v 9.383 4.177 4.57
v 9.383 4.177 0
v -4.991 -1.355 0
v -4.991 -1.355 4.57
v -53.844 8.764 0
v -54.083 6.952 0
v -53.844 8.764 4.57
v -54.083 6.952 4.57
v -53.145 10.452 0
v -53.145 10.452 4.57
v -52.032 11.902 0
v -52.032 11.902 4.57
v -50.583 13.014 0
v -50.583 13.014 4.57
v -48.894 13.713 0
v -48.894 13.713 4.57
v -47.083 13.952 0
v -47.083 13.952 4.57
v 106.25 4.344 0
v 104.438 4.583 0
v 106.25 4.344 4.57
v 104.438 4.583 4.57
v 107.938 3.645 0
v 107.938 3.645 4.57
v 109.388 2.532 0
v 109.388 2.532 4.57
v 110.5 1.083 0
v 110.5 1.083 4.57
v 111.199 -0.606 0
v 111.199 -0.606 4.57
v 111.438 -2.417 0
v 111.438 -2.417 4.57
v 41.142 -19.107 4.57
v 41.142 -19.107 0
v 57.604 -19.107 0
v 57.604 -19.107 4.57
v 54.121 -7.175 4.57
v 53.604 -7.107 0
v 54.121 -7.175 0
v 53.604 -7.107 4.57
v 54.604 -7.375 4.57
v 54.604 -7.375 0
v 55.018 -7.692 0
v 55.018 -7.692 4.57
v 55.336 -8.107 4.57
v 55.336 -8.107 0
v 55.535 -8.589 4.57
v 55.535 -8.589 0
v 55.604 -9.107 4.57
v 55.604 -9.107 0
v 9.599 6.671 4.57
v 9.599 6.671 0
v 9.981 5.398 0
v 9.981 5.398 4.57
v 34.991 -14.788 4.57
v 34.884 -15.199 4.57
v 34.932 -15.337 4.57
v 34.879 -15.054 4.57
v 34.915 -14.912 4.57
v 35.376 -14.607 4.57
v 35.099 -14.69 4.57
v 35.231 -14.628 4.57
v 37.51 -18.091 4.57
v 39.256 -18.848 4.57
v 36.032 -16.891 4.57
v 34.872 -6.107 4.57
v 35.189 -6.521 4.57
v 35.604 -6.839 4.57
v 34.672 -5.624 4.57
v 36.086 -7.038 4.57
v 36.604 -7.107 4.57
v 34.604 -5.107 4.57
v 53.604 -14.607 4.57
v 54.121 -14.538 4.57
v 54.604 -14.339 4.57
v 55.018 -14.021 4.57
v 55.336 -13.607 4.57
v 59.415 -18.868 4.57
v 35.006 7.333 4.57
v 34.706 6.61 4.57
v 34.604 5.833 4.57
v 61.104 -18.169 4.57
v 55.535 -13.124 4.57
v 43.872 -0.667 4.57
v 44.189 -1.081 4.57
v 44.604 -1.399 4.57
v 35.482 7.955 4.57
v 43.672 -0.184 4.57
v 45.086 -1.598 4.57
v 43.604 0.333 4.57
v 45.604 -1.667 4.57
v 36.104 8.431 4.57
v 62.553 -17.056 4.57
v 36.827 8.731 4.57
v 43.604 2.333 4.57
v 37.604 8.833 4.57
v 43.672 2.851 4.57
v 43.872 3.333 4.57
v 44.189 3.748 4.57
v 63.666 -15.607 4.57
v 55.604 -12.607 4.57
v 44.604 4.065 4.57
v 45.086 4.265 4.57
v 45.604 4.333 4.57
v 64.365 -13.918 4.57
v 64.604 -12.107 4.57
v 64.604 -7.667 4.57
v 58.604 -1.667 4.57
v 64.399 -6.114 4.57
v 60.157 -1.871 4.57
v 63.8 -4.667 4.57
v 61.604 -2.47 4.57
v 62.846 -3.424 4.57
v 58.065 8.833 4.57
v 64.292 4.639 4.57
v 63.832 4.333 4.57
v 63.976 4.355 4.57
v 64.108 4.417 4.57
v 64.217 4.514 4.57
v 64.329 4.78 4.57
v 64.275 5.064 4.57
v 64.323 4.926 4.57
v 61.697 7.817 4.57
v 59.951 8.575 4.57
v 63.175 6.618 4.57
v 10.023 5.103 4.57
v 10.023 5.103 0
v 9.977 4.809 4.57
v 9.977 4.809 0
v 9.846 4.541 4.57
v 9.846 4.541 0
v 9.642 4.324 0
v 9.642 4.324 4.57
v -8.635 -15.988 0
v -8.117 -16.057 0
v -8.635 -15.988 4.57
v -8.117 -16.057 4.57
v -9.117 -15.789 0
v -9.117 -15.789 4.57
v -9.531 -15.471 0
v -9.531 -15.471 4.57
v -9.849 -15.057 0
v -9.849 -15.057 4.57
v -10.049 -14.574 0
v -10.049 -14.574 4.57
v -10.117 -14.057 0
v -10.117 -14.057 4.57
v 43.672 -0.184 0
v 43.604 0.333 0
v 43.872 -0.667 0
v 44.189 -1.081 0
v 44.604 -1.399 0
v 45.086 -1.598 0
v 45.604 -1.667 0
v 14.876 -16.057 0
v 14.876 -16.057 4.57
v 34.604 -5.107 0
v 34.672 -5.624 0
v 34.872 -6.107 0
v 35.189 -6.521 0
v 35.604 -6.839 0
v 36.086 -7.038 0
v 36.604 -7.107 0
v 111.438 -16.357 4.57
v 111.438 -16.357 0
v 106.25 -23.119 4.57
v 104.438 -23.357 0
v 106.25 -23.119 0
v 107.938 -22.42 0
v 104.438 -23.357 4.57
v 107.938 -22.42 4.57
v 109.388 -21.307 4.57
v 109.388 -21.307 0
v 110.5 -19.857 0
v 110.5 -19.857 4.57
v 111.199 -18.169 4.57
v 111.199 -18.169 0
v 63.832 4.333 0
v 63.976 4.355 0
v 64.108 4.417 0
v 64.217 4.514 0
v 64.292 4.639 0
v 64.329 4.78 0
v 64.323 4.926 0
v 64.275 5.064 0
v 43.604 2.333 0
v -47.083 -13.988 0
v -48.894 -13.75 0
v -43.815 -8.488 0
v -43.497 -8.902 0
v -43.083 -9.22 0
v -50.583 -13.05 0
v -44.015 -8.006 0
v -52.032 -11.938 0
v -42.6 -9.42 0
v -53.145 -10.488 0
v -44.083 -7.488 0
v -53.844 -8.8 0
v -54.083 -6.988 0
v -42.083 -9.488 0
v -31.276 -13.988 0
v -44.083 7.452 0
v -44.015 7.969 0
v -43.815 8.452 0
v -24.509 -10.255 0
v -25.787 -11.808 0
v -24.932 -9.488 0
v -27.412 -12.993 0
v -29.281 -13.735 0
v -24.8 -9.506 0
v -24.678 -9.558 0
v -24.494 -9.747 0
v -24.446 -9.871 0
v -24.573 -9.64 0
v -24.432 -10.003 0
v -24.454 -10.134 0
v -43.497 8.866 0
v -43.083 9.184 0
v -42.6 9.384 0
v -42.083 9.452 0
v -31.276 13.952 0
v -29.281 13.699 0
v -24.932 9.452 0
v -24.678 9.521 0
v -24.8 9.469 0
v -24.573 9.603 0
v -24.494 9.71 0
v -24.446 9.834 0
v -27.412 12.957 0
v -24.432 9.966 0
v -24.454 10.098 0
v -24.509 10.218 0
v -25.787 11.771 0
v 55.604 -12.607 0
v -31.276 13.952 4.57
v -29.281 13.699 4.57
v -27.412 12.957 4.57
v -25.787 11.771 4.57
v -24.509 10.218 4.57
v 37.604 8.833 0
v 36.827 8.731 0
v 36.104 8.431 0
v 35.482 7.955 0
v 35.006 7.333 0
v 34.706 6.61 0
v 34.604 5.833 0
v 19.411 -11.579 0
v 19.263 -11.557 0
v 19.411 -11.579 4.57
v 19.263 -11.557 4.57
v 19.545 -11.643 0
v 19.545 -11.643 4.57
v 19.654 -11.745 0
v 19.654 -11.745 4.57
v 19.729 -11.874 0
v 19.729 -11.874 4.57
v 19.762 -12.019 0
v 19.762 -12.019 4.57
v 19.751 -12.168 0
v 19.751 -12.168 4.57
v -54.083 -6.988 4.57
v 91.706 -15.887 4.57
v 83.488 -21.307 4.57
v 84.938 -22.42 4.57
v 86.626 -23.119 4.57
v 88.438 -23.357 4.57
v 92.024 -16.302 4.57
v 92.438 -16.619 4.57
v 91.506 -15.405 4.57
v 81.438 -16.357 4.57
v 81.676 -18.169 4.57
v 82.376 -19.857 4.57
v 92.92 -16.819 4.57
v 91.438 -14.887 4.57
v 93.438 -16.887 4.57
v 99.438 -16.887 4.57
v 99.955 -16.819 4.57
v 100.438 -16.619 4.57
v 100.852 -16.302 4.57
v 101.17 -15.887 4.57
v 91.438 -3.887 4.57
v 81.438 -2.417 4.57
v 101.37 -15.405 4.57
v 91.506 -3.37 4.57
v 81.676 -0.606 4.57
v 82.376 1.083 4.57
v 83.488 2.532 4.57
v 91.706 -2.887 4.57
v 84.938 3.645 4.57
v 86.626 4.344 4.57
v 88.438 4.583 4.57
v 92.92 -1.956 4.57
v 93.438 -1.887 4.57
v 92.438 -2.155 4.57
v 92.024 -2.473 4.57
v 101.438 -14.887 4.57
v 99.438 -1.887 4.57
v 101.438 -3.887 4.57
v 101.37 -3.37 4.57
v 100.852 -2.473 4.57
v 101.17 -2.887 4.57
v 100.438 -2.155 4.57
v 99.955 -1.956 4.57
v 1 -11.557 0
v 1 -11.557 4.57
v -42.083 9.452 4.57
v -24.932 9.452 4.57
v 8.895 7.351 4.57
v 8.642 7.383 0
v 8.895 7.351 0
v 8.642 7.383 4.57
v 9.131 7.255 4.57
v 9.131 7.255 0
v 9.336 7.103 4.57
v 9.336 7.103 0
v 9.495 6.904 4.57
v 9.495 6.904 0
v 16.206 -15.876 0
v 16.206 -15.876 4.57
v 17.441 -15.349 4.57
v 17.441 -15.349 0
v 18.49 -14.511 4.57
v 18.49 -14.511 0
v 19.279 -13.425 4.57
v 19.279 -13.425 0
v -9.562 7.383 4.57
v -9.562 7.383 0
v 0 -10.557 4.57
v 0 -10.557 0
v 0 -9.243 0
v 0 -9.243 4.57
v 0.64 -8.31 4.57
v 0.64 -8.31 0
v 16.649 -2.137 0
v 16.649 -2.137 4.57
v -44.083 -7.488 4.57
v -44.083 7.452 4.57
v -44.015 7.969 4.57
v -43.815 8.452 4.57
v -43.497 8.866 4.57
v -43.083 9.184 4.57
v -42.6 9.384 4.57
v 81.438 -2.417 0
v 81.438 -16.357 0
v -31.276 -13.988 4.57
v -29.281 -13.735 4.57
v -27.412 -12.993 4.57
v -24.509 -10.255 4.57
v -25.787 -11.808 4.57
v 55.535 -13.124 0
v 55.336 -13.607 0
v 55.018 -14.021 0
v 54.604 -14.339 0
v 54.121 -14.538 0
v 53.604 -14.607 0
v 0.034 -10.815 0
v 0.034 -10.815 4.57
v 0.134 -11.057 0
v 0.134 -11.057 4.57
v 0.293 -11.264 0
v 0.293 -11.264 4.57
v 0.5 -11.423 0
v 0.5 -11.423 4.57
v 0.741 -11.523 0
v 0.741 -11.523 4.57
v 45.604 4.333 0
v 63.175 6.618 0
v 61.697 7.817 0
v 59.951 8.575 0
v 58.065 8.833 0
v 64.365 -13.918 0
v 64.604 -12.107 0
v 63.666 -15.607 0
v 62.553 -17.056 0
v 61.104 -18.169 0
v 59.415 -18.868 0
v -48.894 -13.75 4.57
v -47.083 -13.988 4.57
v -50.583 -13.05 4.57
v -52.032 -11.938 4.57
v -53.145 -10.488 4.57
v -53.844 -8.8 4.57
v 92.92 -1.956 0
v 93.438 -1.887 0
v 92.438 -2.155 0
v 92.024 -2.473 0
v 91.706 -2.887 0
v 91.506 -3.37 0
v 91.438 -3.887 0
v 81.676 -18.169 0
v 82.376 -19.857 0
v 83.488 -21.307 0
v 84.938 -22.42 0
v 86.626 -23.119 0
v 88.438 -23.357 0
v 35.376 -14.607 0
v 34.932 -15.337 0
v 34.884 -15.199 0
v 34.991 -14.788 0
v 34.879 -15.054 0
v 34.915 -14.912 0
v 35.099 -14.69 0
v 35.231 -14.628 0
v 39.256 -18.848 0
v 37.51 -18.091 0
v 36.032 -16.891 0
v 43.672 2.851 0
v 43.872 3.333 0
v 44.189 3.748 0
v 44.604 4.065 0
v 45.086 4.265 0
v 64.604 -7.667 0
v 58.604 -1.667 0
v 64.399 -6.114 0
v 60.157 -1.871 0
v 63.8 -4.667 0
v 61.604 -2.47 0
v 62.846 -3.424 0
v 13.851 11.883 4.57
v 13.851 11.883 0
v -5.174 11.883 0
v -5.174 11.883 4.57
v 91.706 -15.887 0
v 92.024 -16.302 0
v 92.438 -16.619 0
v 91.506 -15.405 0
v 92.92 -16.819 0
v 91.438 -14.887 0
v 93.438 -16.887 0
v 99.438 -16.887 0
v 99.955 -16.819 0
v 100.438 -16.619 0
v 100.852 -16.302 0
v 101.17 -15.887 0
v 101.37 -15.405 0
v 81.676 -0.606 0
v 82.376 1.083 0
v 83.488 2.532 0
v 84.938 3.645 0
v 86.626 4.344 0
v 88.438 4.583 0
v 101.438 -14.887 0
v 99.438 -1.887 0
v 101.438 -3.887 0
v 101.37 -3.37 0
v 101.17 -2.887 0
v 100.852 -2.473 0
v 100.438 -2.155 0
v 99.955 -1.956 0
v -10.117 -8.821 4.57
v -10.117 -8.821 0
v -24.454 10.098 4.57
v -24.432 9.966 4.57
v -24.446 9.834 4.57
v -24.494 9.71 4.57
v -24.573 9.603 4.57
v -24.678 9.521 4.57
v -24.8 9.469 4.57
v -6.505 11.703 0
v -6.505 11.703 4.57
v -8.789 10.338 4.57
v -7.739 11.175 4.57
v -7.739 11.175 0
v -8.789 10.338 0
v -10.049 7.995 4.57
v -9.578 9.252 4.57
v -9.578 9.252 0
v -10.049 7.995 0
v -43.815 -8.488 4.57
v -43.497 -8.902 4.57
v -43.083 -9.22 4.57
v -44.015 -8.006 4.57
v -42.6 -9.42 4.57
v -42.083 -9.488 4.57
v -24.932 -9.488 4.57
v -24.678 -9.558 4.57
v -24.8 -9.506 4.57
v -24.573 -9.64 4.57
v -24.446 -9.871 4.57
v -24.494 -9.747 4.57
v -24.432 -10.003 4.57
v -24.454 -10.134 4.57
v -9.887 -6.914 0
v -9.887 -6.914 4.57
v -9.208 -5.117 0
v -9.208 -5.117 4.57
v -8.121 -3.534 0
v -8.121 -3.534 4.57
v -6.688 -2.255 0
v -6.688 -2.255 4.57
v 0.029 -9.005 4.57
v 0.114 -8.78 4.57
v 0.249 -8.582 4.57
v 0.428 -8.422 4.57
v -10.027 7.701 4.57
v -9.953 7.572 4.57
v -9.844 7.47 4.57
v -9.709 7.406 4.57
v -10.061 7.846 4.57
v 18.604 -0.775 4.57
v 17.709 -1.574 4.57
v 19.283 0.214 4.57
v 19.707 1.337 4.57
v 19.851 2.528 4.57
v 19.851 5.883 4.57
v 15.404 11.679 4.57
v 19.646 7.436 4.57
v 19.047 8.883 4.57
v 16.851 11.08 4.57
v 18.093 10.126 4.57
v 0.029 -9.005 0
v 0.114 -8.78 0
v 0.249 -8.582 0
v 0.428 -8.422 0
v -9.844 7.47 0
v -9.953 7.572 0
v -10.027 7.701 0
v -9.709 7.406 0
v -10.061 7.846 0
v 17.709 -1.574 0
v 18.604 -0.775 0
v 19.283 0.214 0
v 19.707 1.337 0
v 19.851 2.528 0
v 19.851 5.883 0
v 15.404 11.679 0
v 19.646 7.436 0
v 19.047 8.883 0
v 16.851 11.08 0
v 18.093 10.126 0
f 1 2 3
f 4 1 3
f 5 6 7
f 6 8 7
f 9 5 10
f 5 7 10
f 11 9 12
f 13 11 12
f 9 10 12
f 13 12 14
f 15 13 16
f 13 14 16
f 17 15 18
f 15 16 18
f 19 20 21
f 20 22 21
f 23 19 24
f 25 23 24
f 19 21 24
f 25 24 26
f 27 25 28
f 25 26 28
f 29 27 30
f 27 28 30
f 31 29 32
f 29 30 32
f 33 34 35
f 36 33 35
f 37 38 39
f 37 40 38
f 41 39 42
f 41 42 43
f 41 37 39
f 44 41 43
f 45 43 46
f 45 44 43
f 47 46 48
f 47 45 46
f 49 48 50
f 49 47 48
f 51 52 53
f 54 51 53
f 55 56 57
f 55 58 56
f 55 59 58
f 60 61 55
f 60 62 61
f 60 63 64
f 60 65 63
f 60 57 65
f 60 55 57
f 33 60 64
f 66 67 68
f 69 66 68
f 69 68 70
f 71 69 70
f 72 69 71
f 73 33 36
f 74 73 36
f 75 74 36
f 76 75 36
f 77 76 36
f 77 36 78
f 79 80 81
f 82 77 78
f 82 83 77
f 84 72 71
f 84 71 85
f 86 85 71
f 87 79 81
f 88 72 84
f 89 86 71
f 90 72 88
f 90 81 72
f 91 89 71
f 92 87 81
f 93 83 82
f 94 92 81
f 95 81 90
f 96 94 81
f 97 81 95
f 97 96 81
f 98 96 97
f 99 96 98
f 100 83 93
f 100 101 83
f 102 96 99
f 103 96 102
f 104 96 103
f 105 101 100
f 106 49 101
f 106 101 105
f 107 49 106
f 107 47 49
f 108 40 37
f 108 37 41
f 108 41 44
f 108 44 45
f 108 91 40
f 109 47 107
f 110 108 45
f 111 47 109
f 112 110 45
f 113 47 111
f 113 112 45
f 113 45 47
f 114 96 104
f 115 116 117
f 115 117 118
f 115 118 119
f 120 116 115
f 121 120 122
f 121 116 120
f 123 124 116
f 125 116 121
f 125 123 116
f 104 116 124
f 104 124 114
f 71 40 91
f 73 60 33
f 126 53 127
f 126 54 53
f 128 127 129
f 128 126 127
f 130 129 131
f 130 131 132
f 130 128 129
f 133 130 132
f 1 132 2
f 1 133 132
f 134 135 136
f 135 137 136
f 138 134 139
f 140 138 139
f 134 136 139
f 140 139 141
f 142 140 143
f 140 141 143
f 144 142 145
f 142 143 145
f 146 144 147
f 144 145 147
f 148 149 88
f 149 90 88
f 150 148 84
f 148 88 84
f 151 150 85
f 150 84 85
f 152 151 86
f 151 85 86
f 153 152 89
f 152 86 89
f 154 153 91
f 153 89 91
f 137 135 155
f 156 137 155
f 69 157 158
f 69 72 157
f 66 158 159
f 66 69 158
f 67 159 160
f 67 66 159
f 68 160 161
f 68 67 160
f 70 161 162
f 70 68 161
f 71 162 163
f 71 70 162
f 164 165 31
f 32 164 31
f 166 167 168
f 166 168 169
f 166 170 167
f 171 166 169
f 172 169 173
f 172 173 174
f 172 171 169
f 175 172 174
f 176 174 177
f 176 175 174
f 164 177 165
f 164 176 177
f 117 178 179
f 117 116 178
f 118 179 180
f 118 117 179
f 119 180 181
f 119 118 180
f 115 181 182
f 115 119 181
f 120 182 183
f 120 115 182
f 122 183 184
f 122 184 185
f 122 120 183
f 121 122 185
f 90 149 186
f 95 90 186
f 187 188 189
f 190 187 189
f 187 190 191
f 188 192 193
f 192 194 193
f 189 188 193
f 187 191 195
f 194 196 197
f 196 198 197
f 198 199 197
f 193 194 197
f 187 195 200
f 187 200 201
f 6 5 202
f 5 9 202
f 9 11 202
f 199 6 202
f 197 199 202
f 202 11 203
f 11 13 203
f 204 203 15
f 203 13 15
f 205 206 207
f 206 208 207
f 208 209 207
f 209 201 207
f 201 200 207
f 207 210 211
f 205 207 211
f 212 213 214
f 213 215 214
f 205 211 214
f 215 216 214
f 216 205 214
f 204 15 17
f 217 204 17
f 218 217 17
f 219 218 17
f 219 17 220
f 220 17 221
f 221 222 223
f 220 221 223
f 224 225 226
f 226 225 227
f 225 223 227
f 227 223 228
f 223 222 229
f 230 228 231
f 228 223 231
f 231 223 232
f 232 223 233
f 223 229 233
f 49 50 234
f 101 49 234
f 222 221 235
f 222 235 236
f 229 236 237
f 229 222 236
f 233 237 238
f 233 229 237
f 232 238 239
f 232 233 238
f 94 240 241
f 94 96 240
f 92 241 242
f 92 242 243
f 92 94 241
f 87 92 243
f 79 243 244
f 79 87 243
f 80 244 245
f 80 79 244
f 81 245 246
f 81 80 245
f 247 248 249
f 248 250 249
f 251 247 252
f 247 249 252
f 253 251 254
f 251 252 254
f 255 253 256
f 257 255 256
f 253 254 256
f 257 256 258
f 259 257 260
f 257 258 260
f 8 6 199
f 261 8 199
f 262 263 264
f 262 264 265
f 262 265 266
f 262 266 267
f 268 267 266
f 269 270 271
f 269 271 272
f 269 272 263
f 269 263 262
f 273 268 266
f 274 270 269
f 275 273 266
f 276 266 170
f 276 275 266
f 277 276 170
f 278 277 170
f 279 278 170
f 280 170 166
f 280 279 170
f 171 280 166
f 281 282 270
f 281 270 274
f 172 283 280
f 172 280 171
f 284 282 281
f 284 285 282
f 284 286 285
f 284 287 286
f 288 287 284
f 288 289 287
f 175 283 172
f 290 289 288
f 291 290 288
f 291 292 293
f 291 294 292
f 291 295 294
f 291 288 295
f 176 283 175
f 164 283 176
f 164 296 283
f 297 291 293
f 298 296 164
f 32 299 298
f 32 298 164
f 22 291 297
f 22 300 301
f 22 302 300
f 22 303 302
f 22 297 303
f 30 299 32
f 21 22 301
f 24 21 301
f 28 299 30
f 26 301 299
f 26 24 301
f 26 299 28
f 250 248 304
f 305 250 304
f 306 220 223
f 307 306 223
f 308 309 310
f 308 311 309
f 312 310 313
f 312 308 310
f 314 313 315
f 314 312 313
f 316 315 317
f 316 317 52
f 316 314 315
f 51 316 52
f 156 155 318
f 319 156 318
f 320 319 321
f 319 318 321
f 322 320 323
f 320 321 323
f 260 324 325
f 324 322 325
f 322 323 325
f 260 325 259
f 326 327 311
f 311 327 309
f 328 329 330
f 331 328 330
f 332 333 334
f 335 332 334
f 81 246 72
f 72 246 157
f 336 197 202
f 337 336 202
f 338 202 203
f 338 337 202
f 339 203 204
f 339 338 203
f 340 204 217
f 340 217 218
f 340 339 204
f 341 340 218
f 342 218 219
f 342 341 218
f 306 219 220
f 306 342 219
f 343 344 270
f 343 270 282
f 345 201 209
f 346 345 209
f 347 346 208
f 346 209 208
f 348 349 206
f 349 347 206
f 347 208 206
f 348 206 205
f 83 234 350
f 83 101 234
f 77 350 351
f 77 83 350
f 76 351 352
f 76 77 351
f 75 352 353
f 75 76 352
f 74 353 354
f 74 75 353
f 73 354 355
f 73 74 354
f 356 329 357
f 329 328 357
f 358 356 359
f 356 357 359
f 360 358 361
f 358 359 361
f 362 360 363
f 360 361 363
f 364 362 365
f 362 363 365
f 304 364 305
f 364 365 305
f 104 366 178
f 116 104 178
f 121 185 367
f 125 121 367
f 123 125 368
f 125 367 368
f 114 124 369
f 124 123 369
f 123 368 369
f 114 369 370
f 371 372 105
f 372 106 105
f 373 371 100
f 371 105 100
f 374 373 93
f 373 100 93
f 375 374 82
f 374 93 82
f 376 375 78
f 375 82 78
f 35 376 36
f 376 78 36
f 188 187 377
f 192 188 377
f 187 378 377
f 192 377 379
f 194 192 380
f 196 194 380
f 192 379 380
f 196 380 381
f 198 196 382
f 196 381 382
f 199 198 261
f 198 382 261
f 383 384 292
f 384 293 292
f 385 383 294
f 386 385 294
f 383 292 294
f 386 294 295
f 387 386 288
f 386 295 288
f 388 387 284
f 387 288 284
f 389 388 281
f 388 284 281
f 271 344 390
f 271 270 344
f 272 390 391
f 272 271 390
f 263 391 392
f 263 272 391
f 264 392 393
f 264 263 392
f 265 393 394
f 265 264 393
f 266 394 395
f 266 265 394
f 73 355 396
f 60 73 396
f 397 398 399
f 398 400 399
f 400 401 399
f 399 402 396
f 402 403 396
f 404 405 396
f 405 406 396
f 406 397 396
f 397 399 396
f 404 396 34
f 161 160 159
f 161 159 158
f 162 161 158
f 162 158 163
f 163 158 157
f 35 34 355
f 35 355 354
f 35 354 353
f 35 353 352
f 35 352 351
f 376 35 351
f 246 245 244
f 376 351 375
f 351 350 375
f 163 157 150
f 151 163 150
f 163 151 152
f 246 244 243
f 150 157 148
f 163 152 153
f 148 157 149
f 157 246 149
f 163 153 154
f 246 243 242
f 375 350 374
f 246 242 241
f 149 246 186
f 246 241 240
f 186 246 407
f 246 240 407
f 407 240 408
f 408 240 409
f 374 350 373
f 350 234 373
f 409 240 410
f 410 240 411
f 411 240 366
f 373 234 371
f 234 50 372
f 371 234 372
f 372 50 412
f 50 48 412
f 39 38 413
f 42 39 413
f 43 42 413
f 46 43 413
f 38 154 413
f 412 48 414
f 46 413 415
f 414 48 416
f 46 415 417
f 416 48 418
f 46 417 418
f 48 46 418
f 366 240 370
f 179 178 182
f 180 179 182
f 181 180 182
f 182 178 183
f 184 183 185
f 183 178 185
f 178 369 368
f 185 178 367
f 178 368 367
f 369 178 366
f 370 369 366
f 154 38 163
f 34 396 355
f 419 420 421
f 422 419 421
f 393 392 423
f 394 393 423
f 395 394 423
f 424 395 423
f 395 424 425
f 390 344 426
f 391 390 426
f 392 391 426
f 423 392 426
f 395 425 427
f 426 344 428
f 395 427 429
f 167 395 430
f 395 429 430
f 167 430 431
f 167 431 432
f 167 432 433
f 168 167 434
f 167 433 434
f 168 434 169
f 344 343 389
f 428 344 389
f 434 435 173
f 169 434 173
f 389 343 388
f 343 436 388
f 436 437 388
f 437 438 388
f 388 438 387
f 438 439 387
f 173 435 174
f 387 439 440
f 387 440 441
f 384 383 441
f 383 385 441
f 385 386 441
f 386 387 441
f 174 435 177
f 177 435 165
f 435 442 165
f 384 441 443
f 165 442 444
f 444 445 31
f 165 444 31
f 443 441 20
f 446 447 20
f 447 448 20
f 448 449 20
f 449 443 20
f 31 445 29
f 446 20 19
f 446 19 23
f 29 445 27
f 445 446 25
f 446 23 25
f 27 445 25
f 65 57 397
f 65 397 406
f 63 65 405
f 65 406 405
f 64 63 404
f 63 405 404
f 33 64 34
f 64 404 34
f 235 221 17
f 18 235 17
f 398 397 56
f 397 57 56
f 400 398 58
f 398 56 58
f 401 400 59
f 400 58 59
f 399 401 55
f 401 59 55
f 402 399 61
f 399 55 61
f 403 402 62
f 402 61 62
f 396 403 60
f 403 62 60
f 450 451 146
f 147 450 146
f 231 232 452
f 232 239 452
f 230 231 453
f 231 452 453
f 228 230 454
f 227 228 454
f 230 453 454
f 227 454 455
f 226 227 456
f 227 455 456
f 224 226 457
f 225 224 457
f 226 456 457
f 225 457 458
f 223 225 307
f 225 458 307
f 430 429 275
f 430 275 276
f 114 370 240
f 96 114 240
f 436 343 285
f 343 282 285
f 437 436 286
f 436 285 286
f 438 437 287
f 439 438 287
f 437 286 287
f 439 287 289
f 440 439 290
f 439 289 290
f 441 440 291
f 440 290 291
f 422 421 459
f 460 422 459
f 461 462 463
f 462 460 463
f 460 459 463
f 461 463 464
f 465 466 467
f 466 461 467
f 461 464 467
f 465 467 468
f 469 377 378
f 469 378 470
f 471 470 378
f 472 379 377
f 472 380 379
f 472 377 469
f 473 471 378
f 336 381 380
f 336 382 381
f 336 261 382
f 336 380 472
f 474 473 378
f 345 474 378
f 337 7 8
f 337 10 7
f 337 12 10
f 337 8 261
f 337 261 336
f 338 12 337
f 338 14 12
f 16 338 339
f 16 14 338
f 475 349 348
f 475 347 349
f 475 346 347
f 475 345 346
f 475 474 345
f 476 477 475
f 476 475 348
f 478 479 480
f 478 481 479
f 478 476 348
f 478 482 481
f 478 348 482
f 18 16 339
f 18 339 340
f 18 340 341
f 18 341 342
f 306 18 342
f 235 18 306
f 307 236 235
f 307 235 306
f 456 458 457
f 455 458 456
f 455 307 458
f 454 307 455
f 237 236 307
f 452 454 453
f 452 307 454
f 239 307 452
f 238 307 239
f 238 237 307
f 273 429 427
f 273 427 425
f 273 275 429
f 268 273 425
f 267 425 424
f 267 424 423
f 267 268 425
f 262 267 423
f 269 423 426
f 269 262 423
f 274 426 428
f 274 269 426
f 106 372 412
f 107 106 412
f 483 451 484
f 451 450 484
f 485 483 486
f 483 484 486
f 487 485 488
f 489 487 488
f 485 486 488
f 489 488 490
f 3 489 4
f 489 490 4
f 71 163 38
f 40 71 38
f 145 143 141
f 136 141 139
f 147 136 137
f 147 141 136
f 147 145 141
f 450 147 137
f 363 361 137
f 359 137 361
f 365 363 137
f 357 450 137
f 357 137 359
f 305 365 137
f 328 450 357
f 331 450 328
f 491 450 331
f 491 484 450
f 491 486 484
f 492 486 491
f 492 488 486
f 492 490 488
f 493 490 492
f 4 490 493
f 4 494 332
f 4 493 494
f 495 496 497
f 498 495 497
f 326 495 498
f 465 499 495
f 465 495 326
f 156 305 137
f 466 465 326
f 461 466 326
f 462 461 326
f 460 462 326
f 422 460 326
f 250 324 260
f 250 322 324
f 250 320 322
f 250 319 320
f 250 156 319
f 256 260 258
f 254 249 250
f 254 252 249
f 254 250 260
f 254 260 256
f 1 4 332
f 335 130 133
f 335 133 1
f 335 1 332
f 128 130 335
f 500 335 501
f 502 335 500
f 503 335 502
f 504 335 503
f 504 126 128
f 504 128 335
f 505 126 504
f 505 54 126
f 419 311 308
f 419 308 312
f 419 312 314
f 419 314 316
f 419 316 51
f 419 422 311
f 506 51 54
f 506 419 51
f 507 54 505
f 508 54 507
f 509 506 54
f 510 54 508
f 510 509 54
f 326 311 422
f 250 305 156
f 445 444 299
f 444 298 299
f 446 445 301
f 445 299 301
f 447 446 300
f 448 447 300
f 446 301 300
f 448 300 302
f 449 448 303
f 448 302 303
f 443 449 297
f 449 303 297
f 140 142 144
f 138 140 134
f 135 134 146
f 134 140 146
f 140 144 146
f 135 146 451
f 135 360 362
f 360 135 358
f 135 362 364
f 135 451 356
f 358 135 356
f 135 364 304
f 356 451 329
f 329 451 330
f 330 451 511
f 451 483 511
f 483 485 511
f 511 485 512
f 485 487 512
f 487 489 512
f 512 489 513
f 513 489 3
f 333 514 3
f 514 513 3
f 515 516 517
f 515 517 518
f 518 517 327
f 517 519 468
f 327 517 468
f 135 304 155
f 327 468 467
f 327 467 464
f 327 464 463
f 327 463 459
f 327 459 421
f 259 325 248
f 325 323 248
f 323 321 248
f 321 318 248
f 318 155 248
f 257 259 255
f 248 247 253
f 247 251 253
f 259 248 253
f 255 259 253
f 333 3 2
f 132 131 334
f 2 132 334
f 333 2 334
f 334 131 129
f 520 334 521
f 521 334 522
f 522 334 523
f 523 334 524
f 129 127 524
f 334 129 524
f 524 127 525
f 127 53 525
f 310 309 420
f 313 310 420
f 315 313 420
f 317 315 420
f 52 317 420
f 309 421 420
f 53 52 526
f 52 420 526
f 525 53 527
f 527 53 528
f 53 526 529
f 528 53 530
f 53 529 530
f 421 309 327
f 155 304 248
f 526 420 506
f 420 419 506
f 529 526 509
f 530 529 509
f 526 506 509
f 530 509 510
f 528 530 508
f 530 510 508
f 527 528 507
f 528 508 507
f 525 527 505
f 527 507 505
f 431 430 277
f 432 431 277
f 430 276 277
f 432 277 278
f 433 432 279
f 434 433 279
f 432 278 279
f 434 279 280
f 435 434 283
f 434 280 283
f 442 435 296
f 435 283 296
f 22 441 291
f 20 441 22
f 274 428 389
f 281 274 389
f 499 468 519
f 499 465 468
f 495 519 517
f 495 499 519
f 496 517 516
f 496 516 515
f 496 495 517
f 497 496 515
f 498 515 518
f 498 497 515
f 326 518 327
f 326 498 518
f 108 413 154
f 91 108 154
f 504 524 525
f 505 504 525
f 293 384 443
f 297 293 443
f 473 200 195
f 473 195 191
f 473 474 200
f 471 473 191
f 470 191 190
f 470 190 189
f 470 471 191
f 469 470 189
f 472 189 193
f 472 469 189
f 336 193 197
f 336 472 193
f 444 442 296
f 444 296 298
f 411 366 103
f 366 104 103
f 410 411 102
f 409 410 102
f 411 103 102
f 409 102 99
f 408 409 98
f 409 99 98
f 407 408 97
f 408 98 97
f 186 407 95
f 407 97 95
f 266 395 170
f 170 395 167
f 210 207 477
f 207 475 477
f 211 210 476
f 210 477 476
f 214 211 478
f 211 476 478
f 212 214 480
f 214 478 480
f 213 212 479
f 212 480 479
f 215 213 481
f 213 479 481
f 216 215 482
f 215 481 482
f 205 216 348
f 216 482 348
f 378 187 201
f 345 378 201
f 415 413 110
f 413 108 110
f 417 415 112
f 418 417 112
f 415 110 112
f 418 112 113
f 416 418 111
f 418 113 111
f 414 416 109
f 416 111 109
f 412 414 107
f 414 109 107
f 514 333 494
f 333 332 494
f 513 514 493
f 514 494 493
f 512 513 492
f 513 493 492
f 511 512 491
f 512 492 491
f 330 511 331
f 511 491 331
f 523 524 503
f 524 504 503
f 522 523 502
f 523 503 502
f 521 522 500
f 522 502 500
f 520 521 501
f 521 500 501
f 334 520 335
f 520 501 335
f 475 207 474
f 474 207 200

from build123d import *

# Parameters (mm, degrees)
F1_DEPTH     = 4.57
F2_R         = 2
F3_R         = 7
F4_T1_DEPTH  = 40.5387364248
F5_R         = 0.5
F7_DEPTH     = 4.57
F8_T1_DEPTH  = 29.4446859277
F9_R         = 5
F10_R        = 1
F11_R        = 0.5
F12_R        = 2
F13_R        = 8
F14_R        = 6
F16_DEPTH    = 4.57
F17_T1_DEPTH = 37.2617420766
F18_R        = 0.5
F19_R        = 2
F20_R        = 3
F21_R        = 2
F22_R        = 6
F23_R        = 7
F24_W        = 30
F24_H        = 27.94
F24_W_2      = 10
F24_H_2      = 15
F25_DEPTH    = 4.57
F26_R        = 7
F27_R        = 2


# Not quite as in the source:
# - a fillet or chamfer that OpenCascade refuses, or shapes differently, is made with other operations: its cross-section is extruded or revolved along the edge and cut away or added


with BuildPart() as f1:
    # F0 (on Top) → F1 (new body)
    with BuildSketch(Plane.XY):
        Polygon((-24.0826935321, 9.451819914), (-24.0826935321, 13.951819914), (-54.0826935321, 13.951819914), (-54.0826935321, -13.988180086), (-24.0826935321, -13.988180086), (-24.0826935321, -9.488180086), (-44.0826935321, -9.488180086), (-44.0826935321, 9.451819914), align=None)
    extrude(amount=F1_DEPTH)

    # F2
    f2_edges = [f1.edges().sort_by_distance(p)[0] for p in [
        (-44.082694, 9.45182, 2.285),
        (-44.082694, -9.48818, 2.285),
    ]]
    fillet(f2_edges, radius=F2_R)

    # F3
    f3_edges = [f1.edges().sort_by_distance(p)[0] for p in [
        (-54.082694, 13.95182, 2.285),
        (-54.082694, -13.98818, 2.285),
    ]]
    fillet(f3_edges, radius=F3_R)

    # F4: fillet of radius 8 on 2 edges, made by hand

    # F4_s2 → F4_t1 (cut)
    with BuildSketch(Plane.XY.offset(-17.9843682124)):
        with BuildLine():
            ThreePointArc((-31.2764408171, -13.988180086), (-27.03380013, -12.7705100691), (-24.0826935321, -9.488180086))
            Line((-24.0826935321, -9.488180086), (-24.0826935321, -13.988180086))
            Line((-24.0826935321, -13.988180086), (-31.2764408171, -13.988180086))
        make_face()
        with BuildLine():
            ThreePointArc((-31.2764408171, 13.951819914), (-27.03380013, 12.7341498971), (-24.0826935321, 9.451819914))
            Line((-24.0826935321, 9.451819914), (-24.0826935321, 13.951819914))
            Line((-24.0826935321, 13.951819914), (-31.2764408171, 13.951819914))
        make_face()
    extrude(amount=F4_T1_DEPTH, mode=Mode.SUBTRACT)

    # F5
    f5_edges = [f1.edges().sort_by_distance(p)[0] for p in [
        (-24.082694, -9.48818, 2.285),
        (-24.082694, 9.45182, 2.285),
    ]]
    fillet(f5_edges, radius=F5_R)


with BuildPart() as f7:
    # F6 (on Top) → F7 (new body)
    with BuildSketch(Plane.XY):
        Polygon((19.8506022431, 11.8833926581), (-10.1493977569, 11.8833926581), (-10.1493977569, 7.3833926581), (9.3855382875, 7.3833926581), (10.2475822992, 4.5099139089), (-10.1172720553, -3.3282011872), (-10.1172720553, -16.0566073419), (19.8506022431, -16.0566073419), (19.8506022431, -11.5566073419), (0, -11.5566073419), (0, -8.5566073419), (19.8506022431, -0.9029187956), align=None)
    extrude(amount=F7_DEPTH)

    # F8: fillet of radius 5 on 2 edges, made by hand

    # F8_s2 → F8_t1 (cut)
    with BuildSketch(Plane.XY.offset(-12.4373429638)):
        with BuildLine():
            ThreePointArc((14.8756650576, -16.0566073419), (18.2297670238, -14.7647065855), (19.8506022431, -11.5566073419))
            Line((19.8506022431, -11.5566073419), (19.8506022431, -16.0566073419))
            Line((19.8506022431, -16.0566073419), (14.8756650576, -16.0566073419))
        make_face()
        with BuildLine():
            ThreePointArc((-5.1744605714, 11.8833926581), (-8.5285625376, 10.5914919016), (-10.1493977569, 7.3833926581))
            Line((-10.1493977569, 7.3833926581), (-10.1493977569, 11.8833926581))
            Line((-10.1493977569, 11.8833926581), (-5.1744605714, 11.8833926581))
        make_face()
    extrude(amount=F8_T1_DEPTH, mode=Mode.SUBTRACT)

    # F9
    f9_edges = [f7.edges().sort_by_distance(p)[0] for p in [
        (19.850602, -0.902919, 2.285),
    ]]
    fillet(f9_edges, radius=F9_R)

    # F10
    f10_edges = [f7.edges().sort_by_distance(p)[0] for p in [
        (9.385538, 7.383393, 2.285),
        (10.247582, 4.509914, 2.285),
        (0, -8.556607, 2.285),
        (0, -11.556607, 2.285),
    ]]
    fillet(f10_edges, radius=F10_R)

    # F11
    f11_edges = [f7.edges().sort_by_distance(p)[0] for p in [
        (-10.149398, 7.383393, 2.285),
        (19.850602, -11.556607, 2.285),
    ]]
    fillet(f11_edges, radius=F11_R)

    # F12
    f12_edges = [f7.edges().sort_by_distance(p)[0] for p in [
        (-10.117272, -16.056607, 2.285),
    ]]
    fillet(f12_edges, radius=F12_R)

    # F13
    f13_edges = [f7.edges().sort_by_distance(p)[0] for p in [
        (-10.117272, -3.328201, 2.285),
    ]]
    fillet(f13_edges, radius=F13_R)

    # F14
    f14_edges = [f7.edges().sort_by_distance(p)[0] for p in [
        (19.850602, 11.883393, 2.285),
    ]]
    fillet(f14_edges, radius=F14_R)


with BuildPart() as f16:
    # F15 (on Top) → F16 (new body)
    with BuildSketch(Plane.XY):
        Polygon((64.6036404371, 4.3333959766), (64.6036404371, 8.8333959766), (34.6036404371, 8.8333959766), (34.6036404371, -7.1066040234), (55.6036404371, -7.1066040234), (55.6036404371, -14.6066040234), (34.6036404371, -14.6066040234), (34.6036404371, -19.1066040234), (64.6036404371, -19.1066040234), (64.6036404371, -1.6666040234), (43.6036404371, -1.6666040234), (43.6036404371, 4.3333959766), align=None)
    extrude(amount=F16_DEPTH)

    # F17: fillet of radius 7 on 2 edges, made by hand

    # F17_s2 → F17_t1 (cut)
    with BuildSketch(Plane.XY.offset(-16.3458710383)):
        with BuildLine():
            ThreePointArc((34.6036404371, -14.6066040234), (37.1733618858, -17.8728853208), (41.1419888524, -19.1066040234))
            Line((41.1419888524, -19.1066040234), (34.6036404371, -19.1066040234))
            Line((34.6036404371, -19.1066040234), (34.6036404371, -14.6066040234))
        make_face()
        with BuildLine():
            ThreePointArc((64.6036404371, 4.3333959766), (62.0339189884, 7.5996772739), (58.0652920218, 8.8333959766))
            Line((58.0652920218, 8.8333959766), (64.6036404371, 8.8333959766))
            Line((64.6036404371, 8.8333959766), (64.6036404371, 4.3333959766))
        make_face()
    extrude(amount=F17_T1_DEPTH, mode=Mode.SUBTRACT)

    # F18
    f18_edges = [f16.edges().sort_by_distance(p)[0] for p in [
        (34.60364, -14.606604, 2.285),
        (64.60364, 4.333396, 2.285),
    ]]
    fillet(f18_edges, radius=F18_R)

    # F19
    f19_edges = [f16.edges().sort_by_distance(p)[0] for p in [
        (55.60364, -7.106604, 2.285),
        (55.60364, -14.606604, 2.285),
        (43.60364, -1.666604, 2.285),
        (43.60364, 4.333396, 2.285),
    ]]
    fillet(f19_edges, radius=F19_R)

    # F20
    f20_edges = [f16.edges().sort_by_distance(p)[0] for p in [
        (34.60364, 8.833396, 2.285),
    ]]
    fillet(f20_edges, radius=F20_R)

    # F21
    f21_edges = [f16.edges().sort_by_distance(p)[0] for p in [
        (34.60364, -7.106604, 2.285),
    ]]
    fillet(f21_edges, radius=F21_R)

    # F22
    f22_edges = [f16.edges().sort_by_distance(p)[0] for p in [
        (64.60364, -1.666604, 2.285),
    ]]
    fillet(f22_edges, radius=F22_R)

    # F23
    f23_edges = [f16.edges().sort_by_distance(p)[0] for p in [
        (64.60364, -19.106604, 2.285),
    ]]
    fillet(f23_edges, radius=F23_R)


with BuildPart() as f25:
    # F24 (on Top) → F25 (new body)
    with BuildSketch(Plane.XY):
        with Locations((96.4378112555, -9.3873783189)):
            Rectangle(F24_W, F24_H)
        with Locations((96.4378112555, -9.3873783189)):
            Rectangle(F24_W_2, F24_H_2, mode=Mode.SUBTRACT)
    extrude(amount=F25_DEPTH)

    # F26
    f26_edges = [f25.edges().sort_by_distance(p)[0] for p in [
        (81.437811, -23.357378, 2.285),
        (111.437811, -23.357378, 2.285),
        (111.437811, 4.582622, 2.285),
        (81.437811, 4.582622, 2.285),
    ]]
    fillet(f26_edges, radius=F26_R)

    # F27
    f27_edges = [f25.edges().sort_by_distance(p)[0] for p in [
        (91.437811, -1.887378, 2.285),
        (101.437811, -1.887378, 2.285),
        (101.437811, -16.887378, 2.285),
        (91.437811, -16.887378, 2.285),
    ]]
    fillet(f27_edges, radius=F27_R)


solid = Compound([f1.part, f7.part, f16.part, f25.part])
